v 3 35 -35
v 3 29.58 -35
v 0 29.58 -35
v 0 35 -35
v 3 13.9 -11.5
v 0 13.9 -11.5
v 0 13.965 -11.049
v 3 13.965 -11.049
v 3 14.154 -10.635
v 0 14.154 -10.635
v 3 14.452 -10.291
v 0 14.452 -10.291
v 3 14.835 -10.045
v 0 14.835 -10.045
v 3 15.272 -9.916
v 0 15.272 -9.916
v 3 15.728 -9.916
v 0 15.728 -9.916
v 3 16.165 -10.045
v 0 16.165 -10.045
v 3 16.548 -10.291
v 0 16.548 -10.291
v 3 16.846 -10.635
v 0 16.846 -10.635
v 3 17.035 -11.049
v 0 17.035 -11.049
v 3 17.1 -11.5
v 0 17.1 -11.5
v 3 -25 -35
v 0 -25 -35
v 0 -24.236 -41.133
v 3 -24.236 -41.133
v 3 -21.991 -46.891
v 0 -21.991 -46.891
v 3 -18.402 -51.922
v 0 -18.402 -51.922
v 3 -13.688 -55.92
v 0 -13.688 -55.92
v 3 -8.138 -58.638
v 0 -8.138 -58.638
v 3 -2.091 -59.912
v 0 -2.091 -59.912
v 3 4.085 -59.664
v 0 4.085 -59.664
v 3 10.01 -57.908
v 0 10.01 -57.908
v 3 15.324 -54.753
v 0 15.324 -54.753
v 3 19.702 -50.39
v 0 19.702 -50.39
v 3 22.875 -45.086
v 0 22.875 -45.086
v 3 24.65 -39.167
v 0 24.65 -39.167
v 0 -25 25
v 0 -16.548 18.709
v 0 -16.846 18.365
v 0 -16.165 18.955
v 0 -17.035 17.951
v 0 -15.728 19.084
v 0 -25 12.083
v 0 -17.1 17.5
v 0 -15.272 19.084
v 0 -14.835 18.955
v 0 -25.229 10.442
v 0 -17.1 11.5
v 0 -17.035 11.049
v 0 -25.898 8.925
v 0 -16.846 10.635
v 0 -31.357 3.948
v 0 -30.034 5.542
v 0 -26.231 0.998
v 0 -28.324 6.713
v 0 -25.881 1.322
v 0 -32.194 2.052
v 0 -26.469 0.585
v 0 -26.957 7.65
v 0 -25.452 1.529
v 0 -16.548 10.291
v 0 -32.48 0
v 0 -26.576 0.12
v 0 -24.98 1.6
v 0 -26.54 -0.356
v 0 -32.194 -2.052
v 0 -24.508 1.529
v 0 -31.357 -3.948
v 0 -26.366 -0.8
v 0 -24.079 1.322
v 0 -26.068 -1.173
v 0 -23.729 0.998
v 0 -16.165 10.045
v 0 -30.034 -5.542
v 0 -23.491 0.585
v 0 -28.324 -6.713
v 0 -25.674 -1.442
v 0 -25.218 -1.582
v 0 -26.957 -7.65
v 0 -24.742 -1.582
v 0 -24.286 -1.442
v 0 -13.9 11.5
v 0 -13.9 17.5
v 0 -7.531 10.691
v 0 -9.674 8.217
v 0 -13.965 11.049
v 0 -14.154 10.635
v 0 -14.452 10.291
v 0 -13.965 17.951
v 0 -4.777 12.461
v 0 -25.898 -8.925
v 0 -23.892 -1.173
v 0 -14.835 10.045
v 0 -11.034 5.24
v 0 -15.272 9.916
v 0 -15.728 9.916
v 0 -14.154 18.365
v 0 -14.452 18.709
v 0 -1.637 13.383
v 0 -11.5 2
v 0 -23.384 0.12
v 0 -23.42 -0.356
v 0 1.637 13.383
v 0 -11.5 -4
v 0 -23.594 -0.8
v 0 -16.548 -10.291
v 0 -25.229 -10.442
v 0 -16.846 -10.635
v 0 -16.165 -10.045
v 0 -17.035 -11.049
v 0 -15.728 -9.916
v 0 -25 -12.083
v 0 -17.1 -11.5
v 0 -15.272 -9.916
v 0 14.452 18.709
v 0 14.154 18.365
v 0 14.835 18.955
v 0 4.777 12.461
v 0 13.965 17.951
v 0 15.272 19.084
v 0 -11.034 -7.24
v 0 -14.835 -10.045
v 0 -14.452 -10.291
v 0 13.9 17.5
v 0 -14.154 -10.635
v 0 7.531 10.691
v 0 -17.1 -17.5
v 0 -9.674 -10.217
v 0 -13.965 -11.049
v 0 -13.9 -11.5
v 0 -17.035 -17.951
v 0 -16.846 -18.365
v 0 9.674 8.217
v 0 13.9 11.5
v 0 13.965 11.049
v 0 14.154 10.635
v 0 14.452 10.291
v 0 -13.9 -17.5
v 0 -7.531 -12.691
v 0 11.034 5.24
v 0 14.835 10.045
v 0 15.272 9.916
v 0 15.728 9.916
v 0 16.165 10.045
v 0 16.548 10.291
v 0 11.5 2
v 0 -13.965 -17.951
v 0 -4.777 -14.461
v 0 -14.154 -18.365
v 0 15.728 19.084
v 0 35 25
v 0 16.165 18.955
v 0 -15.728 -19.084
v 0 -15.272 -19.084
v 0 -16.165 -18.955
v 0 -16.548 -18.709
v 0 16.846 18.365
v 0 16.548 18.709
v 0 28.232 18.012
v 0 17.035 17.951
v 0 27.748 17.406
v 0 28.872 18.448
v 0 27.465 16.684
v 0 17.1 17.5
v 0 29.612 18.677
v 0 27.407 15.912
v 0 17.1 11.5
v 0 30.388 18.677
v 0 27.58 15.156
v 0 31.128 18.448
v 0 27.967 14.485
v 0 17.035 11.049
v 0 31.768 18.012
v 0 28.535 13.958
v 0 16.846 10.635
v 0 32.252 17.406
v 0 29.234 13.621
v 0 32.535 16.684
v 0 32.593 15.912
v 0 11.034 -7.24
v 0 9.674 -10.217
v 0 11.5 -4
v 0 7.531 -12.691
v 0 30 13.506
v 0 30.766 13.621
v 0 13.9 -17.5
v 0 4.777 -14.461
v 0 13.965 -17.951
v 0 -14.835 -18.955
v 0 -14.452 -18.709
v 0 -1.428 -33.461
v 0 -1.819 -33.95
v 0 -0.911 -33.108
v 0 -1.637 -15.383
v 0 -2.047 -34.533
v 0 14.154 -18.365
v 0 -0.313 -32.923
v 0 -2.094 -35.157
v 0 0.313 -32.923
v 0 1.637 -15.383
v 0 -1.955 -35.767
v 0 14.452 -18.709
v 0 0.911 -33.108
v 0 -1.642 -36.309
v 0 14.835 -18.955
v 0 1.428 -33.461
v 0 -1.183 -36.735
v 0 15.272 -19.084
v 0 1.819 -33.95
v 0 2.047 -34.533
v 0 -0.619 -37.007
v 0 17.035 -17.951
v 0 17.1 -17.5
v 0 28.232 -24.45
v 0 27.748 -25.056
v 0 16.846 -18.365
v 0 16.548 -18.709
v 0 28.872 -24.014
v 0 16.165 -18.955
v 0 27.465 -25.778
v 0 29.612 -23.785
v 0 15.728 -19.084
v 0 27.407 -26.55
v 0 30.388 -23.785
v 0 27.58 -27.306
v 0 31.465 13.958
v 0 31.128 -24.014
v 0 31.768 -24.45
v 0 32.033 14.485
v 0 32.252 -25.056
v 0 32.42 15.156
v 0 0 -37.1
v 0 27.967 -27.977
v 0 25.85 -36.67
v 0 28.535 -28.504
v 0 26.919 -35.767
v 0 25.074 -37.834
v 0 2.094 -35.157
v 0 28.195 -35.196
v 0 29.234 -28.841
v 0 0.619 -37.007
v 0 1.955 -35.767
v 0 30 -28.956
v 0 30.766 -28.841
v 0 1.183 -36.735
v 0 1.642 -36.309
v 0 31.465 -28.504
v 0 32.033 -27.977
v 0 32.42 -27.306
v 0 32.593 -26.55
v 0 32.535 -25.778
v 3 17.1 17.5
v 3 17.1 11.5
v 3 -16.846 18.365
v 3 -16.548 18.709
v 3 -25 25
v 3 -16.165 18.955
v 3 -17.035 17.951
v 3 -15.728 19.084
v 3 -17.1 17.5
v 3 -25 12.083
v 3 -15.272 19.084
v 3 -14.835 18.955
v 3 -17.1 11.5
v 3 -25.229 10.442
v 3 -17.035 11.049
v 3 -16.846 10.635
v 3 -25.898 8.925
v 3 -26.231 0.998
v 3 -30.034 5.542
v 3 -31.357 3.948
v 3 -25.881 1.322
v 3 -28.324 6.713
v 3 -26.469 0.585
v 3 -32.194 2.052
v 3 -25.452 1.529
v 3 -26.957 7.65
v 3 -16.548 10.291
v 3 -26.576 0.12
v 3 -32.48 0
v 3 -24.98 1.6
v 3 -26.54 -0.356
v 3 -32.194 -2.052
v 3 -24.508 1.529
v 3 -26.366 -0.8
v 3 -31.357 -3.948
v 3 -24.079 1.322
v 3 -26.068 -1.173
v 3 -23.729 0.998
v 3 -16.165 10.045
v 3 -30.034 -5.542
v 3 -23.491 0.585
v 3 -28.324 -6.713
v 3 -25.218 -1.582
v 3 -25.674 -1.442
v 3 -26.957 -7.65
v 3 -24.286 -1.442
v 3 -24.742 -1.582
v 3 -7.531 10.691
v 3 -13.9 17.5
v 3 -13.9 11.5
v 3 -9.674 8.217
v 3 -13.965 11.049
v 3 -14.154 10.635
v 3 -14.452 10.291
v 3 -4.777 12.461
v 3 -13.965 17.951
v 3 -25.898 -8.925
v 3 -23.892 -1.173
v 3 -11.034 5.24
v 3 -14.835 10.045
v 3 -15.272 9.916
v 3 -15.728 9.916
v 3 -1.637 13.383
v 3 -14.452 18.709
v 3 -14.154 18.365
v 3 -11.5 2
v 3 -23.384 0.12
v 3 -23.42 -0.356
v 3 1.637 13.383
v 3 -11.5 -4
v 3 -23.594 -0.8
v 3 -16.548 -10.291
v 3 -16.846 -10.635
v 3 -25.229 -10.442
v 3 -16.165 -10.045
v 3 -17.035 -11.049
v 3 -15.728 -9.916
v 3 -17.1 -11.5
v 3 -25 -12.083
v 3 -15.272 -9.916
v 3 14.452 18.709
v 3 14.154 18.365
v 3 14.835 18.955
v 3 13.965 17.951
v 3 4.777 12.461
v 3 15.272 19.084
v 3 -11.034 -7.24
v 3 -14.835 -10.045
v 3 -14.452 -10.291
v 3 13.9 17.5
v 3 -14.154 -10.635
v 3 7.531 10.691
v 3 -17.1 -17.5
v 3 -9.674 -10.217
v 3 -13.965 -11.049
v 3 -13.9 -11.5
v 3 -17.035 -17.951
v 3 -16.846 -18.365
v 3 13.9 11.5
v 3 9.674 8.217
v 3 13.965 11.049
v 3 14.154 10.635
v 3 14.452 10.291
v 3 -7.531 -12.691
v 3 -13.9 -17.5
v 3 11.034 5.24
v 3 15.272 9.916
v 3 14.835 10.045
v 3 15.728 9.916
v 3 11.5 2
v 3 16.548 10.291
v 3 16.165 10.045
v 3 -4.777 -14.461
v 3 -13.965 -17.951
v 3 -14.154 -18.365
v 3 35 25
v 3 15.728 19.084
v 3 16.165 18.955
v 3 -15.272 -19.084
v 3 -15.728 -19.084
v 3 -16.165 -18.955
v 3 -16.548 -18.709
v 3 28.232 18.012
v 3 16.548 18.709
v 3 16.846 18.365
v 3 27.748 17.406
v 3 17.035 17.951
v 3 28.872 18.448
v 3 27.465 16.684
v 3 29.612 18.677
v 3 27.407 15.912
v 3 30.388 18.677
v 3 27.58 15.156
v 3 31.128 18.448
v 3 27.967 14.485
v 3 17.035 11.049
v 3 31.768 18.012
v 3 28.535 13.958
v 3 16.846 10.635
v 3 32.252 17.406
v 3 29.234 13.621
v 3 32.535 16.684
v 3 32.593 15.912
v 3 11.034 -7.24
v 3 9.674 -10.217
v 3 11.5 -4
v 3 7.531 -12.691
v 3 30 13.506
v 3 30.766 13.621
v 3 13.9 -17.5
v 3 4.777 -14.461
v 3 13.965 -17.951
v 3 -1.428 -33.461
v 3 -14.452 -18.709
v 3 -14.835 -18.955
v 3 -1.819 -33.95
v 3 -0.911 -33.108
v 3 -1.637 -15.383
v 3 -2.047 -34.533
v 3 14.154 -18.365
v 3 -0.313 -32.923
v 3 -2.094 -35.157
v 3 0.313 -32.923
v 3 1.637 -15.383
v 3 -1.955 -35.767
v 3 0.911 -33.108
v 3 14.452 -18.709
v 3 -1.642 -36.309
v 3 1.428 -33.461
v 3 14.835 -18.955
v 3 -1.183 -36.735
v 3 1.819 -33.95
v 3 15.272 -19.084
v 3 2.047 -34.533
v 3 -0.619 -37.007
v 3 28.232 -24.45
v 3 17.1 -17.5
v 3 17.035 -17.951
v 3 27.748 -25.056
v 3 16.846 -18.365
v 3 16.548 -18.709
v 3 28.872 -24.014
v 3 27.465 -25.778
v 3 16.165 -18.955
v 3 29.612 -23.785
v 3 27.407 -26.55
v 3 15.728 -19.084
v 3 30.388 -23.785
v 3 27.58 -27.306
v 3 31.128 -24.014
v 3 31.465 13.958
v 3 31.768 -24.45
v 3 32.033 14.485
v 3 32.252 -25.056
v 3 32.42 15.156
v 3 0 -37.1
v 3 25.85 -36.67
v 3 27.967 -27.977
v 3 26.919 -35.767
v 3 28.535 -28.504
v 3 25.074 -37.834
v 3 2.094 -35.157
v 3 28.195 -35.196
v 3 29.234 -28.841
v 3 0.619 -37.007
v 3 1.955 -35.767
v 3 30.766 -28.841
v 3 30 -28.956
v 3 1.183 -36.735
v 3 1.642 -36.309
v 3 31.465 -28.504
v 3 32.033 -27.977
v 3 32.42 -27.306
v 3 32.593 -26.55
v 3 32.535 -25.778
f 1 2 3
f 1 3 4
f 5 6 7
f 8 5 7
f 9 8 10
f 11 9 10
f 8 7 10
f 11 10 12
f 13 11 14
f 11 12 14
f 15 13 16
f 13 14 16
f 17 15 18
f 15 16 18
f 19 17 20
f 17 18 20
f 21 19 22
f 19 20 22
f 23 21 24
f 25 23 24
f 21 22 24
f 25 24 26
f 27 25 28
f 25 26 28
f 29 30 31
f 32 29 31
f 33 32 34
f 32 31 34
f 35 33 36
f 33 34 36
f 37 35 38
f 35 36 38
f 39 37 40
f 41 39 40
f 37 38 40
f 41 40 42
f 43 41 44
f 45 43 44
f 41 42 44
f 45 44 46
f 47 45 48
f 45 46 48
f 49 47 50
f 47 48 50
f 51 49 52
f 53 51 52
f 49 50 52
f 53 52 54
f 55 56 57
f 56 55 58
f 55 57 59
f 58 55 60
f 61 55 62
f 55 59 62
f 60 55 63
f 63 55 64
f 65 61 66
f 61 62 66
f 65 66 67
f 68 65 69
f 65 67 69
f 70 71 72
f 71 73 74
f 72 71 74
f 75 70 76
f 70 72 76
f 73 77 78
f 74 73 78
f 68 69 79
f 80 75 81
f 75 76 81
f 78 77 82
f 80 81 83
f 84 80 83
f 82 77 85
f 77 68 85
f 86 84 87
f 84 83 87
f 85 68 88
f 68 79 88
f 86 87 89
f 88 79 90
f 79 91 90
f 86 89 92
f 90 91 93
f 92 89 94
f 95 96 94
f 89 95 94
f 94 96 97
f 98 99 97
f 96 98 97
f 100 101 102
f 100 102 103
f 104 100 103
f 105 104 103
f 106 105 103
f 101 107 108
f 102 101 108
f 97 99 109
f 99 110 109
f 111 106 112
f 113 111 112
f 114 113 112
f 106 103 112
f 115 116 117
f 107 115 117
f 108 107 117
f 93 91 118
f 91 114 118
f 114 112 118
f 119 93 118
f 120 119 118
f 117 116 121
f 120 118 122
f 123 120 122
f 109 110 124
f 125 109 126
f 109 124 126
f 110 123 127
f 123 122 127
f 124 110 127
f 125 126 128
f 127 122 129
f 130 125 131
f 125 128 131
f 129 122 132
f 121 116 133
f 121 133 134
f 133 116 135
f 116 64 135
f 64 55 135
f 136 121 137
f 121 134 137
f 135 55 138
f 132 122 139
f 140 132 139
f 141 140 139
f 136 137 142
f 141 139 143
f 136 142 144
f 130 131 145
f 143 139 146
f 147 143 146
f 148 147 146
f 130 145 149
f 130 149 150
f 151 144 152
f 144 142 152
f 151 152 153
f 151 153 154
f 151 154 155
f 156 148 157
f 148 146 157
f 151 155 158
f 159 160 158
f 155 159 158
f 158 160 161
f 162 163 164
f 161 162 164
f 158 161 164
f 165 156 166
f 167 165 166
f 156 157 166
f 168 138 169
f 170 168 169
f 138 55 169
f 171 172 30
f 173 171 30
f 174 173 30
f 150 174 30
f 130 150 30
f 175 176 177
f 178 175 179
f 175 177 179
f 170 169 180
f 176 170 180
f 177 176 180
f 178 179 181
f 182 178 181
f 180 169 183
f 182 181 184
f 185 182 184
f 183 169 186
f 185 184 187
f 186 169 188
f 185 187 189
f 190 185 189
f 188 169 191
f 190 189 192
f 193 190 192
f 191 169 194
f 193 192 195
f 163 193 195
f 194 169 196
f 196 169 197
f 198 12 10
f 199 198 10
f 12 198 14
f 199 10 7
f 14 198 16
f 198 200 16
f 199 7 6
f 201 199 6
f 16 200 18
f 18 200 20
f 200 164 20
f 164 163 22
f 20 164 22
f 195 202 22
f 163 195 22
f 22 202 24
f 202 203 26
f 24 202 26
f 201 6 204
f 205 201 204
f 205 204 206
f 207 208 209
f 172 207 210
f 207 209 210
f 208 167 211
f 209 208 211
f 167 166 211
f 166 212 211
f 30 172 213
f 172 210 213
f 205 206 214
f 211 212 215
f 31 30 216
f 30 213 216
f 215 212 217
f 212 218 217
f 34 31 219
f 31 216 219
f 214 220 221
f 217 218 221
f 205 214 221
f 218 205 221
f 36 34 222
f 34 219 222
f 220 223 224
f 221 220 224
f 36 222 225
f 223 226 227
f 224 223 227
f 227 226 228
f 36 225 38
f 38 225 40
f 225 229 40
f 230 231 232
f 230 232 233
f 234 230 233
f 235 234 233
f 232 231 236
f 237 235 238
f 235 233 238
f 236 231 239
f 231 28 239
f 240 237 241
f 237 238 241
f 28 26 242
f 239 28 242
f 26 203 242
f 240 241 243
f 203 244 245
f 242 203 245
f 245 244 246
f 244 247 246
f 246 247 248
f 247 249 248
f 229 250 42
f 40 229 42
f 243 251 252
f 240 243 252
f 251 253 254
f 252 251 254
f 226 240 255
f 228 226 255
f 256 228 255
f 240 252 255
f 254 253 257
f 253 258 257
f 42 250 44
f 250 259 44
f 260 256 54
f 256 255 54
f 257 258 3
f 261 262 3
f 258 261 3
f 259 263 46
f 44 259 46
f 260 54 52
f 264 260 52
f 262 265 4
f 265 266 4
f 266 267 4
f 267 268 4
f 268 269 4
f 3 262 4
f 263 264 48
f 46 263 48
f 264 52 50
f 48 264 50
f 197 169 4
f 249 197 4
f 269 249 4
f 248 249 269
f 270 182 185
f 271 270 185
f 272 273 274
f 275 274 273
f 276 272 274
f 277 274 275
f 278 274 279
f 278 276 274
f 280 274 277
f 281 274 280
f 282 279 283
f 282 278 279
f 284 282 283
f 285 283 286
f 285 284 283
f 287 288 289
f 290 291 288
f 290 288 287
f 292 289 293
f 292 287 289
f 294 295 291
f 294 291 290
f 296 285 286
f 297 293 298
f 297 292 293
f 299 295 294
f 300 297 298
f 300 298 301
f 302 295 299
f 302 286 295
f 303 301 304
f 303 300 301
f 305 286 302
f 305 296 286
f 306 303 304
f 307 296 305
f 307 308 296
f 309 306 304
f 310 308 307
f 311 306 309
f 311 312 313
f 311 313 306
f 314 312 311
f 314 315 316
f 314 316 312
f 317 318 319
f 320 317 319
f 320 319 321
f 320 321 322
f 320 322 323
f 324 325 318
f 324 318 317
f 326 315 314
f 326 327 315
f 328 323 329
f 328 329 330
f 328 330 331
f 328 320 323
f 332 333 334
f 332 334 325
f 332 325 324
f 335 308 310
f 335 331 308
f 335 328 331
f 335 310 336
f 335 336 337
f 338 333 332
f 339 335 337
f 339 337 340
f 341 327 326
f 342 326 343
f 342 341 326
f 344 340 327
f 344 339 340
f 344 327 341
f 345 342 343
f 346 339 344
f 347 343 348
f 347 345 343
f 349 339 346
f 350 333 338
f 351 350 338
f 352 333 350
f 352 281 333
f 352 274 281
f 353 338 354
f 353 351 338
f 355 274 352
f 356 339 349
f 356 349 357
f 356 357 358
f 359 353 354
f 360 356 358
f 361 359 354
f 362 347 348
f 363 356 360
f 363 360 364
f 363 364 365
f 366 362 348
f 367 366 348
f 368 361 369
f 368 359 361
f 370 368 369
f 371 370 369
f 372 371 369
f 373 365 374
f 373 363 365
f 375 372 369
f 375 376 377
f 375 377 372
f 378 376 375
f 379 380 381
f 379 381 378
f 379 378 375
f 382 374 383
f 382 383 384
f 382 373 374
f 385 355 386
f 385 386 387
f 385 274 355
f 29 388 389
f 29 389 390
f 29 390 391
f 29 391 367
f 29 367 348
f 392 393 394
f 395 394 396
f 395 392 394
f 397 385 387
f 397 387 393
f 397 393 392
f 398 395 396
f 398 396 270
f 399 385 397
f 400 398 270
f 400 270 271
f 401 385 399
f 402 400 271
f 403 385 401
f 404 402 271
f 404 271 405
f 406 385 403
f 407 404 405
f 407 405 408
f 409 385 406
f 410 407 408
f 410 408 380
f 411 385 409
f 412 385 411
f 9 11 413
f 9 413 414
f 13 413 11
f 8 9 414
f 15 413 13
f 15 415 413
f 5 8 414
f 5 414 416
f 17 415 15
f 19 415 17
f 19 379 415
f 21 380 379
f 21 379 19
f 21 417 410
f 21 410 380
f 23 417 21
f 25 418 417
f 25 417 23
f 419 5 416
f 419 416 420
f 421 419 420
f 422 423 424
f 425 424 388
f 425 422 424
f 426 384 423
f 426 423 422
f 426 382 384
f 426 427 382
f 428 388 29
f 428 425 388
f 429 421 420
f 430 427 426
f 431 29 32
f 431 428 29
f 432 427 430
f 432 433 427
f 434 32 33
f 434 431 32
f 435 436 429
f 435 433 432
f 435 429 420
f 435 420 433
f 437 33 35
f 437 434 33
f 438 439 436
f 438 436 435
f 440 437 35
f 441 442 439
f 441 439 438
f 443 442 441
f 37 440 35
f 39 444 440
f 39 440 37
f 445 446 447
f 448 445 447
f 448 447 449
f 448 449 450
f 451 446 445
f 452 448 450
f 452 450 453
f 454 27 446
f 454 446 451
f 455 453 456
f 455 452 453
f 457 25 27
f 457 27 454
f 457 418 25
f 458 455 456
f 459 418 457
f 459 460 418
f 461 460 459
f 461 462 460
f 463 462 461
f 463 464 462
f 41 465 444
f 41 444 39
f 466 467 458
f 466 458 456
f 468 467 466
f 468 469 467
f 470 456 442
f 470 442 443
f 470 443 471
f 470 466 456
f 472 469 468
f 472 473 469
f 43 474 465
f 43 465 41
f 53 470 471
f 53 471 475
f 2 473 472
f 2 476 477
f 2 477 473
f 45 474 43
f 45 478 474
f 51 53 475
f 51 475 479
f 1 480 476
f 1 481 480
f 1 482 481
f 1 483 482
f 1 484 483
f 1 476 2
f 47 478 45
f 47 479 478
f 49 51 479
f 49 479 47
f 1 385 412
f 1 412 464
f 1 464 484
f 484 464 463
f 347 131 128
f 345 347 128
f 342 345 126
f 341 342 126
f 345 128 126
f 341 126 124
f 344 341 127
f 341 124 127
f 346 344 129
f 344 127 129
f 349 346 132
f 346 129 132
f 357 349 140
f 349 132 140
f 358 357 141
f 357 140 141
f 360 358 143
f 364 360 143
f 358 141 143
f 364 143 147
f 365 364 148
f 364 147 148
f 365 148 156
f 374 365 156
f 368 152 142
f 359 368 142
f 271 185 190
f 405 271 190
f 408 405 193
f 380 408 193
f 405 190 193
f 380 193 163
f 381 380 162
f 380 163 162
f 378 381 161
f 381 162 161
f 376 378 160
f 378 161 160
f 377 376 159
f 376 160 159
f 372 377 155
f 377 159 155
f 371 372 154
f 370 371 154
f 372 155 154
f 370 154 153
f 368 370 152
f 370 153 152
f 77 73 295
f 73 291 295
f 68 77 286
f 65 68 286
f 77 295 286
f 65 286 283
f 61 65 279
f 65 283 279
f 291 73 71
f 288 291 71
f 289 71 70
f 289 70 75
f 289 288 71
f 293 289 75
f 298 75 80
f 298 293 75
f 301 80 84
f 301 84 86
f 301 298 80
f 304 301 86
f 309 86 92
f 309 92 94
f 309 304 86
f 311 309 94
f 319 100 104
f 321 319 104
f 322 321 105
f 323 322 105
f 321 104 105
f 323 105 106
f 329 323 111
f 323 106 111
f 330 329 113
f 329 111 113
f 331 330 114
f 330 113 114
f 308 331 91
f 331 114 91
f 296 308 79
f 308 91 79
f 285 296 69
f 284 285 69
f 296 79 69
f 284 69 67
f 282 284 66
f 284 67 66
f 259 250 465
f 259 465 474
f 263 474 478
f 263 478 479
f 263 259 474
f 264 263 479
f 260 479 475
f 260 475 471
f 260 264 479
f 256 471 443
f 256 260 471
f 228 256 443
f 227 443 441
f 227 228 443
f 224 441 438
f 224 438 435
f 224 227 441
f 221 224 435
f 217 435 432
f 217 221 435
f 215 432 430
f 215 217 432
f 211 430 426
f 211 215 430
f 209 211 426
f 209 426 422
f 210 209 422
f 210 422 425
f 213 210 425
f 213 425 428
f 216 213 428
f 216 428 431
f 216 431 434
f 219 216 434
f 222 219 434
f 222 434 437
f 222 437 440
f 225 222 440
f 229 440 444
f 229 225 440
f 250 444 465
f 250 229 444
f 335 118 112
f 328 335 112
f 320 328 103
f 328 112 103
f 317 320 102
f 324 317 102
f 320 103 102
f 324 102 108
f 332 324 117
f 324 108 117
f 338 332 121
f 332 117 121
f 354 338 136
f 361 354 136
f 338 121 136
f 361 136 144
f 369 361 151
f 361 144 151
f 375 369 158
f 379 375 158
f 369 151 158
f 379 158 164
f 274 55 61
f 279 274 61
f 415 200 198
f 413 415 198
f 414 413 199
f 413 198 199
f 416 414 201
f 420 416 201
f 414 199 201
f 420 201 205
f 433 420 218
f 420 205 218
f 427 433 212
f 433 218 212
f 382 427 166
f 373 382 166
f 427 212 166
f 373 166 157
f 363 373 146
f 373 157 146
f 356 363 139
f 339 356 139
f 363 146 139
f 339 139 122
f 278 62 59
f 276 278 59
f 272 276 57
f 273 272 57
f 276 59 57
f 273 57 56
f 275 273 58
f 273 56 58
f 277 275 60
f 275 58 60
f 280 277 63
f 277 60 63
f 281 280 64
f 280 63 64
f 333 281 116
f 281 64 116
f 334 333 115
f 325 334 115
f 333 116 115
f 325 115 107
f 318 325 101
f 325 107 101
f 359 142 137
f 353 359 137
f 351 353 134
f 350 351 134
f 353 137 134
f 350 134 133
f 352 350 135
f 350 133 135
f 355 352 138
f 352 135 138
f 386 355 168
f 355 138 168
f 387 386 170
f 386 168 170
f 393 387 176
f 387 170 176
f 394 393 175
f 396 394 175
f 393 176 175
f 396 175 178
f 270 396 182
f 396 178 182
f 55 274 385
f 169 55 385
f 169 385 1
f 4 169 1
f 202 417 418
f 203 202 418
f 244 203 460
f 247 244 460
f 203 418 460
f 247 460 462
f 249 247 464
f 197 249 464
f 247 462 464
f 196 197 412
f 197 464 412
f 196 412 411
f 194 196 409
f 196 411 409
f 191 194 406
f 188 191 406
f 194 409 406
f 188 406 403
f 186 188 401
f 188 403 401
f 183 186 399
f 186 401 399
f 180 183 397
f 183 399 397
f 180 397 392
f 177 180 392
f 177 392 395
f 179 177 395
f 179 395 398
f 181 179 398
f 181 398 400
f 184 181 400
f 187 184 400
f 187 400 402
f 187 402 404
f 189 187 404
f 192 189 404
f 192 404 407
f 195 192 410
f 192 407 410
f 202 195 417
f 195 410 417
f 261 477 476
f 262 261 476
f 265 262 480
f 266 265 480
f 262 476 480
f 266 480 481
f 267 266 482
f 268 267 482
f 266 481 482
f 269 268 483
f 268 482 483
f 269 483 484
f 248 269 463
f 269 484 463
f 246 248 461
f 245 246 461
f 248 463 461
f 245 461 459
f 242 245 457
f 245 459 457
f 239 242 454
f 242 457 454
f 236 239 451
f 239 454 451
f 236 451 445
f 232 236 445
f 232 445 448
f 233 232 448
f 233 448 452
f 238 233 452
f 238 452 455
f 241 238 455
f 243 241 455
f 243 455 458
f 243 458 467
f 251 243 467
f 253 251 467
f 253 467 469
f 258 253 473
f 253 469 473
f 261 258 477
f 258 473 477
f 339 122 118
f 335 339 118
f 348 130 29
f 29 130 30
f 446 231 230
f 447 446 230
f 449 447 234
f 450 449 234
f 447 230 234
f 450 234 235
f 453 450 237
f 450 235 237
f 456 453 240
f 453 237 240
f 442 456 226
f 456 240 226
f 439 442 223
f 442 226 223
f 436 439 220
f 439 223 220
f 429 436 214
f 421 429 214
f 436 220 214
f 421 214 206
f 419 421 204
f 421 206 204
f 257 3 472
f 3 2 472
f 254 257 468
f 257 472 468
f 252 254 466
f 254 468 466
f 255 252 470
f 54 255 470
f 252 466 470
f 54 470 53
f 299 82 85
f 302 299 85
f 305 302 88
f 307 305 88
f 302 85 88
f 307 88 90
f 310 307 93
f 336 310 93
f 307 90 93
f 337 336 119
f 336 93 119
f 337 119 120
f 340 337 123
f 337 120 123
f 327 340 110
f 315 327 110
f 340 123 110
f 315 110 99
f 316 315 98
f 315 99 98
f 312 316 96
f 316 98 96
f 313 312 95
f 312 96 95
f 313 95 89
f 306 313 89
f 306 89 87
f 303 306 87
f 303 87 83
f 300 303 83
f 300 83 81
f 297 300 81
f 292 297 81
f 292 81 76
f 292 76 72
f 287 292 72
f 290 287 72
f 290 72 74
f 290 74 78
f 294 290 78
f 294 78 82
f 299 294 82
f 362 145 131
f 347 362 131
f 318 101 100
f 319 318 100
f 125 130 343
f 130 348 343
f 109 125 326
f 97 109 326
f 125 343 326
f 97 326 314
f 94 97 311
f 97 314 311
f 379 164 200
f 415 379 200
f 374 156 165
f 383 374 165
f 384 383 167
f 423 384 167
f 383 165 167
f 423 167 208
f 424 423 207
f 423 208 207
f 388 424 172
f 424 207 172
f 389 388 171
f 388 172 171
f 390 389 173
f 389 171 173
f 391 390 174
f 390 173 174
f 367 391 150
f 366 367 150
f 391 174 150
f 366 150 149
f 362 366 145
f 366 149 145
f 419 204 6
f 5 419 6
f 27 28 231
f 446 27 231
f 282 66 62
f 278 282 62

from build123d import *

# Parameters (mm, degrees)
SKETCH1_R           = 2.1
BOSS_EXTRUDE2_DEPTH = 3
SKETCH2_R           = 7.5
BOSS_EXTRUDE3_DEPTH = 3
SKETCH3_W           = 60
SKETCH3_H           = 10
SKETCH3_R           = 2.6
BOSS_EXTRUDE4_DEPTH = 3
FILLET3_R           = 5
SKETCH4_R           = 1.6
CUT_EXTRUDE1_DEPTH  = 4
FILLET4_R           = 6


with BuildPart() as part:
    # Sketch1 → Boss-Extrude2 (new body)
    with BuildSketch(Plane(origin=(0, 0, 0), x_dir=(0, 0, -1), z_dir=(1, 0, 0))):
        with BuildLine():
            ThreePointArc((35, -25), (60, 0), (35, 25))
            Line((35, 25), (-25, 25))
            Line((-25, 25), (-25, -25))
            Line((-25, -25), (35, -25))
        make_face()
        with BuildLine():
            Line((-11.5, -17.1), (-17.5, -17.1))
            ThreePointArc((-17.5, -17.1), (-19.1, -15.5), (-17.5, -13.9))
            Line((-17.5, -13.9), (-11.5, -13.9))
            ThreePointArc((-11.5, -13.9), (-9.9, -15.5), (-11.5, -17.1))
        make_face(mode=Mode.SUBTRACT)
        with Locations((35, 0)):
            Circle(SKETCH1_R, mode=Mode.SUBTRACT)
        with BuildLine():
            Line((11.5, 17.1), (17.5, 17.1))
            ThreePointArc((17.5, 17.1), (19.1, 15.5), (17.5, 13.9))
            Line((17.5, 13.9), (11.5, 13.9))
            ThreePointArc((11.5, 13.9), (9.9, 15.5), (11.5, 17.1))
        make_face(mode=Mode.SUBTRACT)
        with BuildLine():
            ThreePointArc((4, 11.5), (15.5, 0), (4, -11.5))
            Line((4, -11.5), (-2, -11.5))
            ThreePointArc((-2, -11.5), (-13.5, 0), (-2, 11.5))
            Line((-2, 11.5), (4, 11.5))
        make_face(mode=Mode.SUBTRACT)
        with BuildLine():
            Line((11.5, -13.9), (17.5, -13.9))
            ThreePointArc((17.5, -13.9), (19.1, -15.5), (17.5, -17.1))
            Line((17.5, -17.1), (11.5, -17.1))
            ThreePointArc((11.5, -17.1), (9.9, -15.5), (11.5, -13.9))
        make_face(mode=Mode.SUBTRACT)
        with BuildLine():
            ThreePointArc((-17.5, 13.9), (-19.1, 15.5), (-17.5, 17.1))
            Line((-17.5, 17.1), (-11.5, 17.1))
            ThreePointArc((-11.5, 17.1), (-9.9, 15.5), (-11.5, 13.9))
            Line((-11.5, 13.9), (-17.5, 13.9))
        make_face(mode=Mode.SUBTRACT)
    extrude(amount=BOSS_EXTRUDE2_DEPTH)

    # Sketch2 → Boss-Extrude3 (add)
    with BuildSketch(Plane(origin=(3, 0, 0), x_dir=(0, 0, -1), z_dir=(1, 0, 0))):
        with Locations((0, -24.979991994)):
            Circle(SKETCH2_R)
    extrude(amount=-BOSS_EXTRUDE3_DEPTH)

    # Sketch3 → Boss-Extrude4 (add)
    with BuildSketch(Plane(origin=(3, 0, 0), x_dir=(0, 0, -1), z_dir=(1, 0, 0))):
        with Locations((5, 30)):
            Rectangle(SKETCH3_W, SKETCH3_H)
        with Locations((-16.105832267, 30)):
            Circle(SKETCH3_R, mode=Mode.SUBTRACT)
        with Locations((26.356099555, 30)):
            Circle(SKETCH3_R, mode=Mode.SUBTRACT)
    extrude(amount=-BOSS_EXTRUDE4_DEPTH)

    # Fillet3
    fillet3_edges = [part.edges().sort_by_distance(p)[0] for p in [
        (1.5, 25, -35),
    ]]
    fillet(fillet3_edges, radius=FILLET3_R)

    # Sketch4 → Cut-Extrude1 (cut, through all)
    with BuildSketch(Plane.ZY):
        with Locations((0, -24.979991994)):
            Circle(SKETCH4_R)
    extrude(amount=-CUT_EXTRUDE1_DEPTH, mode=Mode.SUBTRACT)

    # Fillet4
    fillet4_edges = [part.edges().sort_by_distance(p)[0] for p in [
        (1.5, -25, 7.499973312),
        (1.5, -25, -7.499973312),
    ]]
    fillet(fillet4_edges, radius=FILLET4_R)


solid = part.part
